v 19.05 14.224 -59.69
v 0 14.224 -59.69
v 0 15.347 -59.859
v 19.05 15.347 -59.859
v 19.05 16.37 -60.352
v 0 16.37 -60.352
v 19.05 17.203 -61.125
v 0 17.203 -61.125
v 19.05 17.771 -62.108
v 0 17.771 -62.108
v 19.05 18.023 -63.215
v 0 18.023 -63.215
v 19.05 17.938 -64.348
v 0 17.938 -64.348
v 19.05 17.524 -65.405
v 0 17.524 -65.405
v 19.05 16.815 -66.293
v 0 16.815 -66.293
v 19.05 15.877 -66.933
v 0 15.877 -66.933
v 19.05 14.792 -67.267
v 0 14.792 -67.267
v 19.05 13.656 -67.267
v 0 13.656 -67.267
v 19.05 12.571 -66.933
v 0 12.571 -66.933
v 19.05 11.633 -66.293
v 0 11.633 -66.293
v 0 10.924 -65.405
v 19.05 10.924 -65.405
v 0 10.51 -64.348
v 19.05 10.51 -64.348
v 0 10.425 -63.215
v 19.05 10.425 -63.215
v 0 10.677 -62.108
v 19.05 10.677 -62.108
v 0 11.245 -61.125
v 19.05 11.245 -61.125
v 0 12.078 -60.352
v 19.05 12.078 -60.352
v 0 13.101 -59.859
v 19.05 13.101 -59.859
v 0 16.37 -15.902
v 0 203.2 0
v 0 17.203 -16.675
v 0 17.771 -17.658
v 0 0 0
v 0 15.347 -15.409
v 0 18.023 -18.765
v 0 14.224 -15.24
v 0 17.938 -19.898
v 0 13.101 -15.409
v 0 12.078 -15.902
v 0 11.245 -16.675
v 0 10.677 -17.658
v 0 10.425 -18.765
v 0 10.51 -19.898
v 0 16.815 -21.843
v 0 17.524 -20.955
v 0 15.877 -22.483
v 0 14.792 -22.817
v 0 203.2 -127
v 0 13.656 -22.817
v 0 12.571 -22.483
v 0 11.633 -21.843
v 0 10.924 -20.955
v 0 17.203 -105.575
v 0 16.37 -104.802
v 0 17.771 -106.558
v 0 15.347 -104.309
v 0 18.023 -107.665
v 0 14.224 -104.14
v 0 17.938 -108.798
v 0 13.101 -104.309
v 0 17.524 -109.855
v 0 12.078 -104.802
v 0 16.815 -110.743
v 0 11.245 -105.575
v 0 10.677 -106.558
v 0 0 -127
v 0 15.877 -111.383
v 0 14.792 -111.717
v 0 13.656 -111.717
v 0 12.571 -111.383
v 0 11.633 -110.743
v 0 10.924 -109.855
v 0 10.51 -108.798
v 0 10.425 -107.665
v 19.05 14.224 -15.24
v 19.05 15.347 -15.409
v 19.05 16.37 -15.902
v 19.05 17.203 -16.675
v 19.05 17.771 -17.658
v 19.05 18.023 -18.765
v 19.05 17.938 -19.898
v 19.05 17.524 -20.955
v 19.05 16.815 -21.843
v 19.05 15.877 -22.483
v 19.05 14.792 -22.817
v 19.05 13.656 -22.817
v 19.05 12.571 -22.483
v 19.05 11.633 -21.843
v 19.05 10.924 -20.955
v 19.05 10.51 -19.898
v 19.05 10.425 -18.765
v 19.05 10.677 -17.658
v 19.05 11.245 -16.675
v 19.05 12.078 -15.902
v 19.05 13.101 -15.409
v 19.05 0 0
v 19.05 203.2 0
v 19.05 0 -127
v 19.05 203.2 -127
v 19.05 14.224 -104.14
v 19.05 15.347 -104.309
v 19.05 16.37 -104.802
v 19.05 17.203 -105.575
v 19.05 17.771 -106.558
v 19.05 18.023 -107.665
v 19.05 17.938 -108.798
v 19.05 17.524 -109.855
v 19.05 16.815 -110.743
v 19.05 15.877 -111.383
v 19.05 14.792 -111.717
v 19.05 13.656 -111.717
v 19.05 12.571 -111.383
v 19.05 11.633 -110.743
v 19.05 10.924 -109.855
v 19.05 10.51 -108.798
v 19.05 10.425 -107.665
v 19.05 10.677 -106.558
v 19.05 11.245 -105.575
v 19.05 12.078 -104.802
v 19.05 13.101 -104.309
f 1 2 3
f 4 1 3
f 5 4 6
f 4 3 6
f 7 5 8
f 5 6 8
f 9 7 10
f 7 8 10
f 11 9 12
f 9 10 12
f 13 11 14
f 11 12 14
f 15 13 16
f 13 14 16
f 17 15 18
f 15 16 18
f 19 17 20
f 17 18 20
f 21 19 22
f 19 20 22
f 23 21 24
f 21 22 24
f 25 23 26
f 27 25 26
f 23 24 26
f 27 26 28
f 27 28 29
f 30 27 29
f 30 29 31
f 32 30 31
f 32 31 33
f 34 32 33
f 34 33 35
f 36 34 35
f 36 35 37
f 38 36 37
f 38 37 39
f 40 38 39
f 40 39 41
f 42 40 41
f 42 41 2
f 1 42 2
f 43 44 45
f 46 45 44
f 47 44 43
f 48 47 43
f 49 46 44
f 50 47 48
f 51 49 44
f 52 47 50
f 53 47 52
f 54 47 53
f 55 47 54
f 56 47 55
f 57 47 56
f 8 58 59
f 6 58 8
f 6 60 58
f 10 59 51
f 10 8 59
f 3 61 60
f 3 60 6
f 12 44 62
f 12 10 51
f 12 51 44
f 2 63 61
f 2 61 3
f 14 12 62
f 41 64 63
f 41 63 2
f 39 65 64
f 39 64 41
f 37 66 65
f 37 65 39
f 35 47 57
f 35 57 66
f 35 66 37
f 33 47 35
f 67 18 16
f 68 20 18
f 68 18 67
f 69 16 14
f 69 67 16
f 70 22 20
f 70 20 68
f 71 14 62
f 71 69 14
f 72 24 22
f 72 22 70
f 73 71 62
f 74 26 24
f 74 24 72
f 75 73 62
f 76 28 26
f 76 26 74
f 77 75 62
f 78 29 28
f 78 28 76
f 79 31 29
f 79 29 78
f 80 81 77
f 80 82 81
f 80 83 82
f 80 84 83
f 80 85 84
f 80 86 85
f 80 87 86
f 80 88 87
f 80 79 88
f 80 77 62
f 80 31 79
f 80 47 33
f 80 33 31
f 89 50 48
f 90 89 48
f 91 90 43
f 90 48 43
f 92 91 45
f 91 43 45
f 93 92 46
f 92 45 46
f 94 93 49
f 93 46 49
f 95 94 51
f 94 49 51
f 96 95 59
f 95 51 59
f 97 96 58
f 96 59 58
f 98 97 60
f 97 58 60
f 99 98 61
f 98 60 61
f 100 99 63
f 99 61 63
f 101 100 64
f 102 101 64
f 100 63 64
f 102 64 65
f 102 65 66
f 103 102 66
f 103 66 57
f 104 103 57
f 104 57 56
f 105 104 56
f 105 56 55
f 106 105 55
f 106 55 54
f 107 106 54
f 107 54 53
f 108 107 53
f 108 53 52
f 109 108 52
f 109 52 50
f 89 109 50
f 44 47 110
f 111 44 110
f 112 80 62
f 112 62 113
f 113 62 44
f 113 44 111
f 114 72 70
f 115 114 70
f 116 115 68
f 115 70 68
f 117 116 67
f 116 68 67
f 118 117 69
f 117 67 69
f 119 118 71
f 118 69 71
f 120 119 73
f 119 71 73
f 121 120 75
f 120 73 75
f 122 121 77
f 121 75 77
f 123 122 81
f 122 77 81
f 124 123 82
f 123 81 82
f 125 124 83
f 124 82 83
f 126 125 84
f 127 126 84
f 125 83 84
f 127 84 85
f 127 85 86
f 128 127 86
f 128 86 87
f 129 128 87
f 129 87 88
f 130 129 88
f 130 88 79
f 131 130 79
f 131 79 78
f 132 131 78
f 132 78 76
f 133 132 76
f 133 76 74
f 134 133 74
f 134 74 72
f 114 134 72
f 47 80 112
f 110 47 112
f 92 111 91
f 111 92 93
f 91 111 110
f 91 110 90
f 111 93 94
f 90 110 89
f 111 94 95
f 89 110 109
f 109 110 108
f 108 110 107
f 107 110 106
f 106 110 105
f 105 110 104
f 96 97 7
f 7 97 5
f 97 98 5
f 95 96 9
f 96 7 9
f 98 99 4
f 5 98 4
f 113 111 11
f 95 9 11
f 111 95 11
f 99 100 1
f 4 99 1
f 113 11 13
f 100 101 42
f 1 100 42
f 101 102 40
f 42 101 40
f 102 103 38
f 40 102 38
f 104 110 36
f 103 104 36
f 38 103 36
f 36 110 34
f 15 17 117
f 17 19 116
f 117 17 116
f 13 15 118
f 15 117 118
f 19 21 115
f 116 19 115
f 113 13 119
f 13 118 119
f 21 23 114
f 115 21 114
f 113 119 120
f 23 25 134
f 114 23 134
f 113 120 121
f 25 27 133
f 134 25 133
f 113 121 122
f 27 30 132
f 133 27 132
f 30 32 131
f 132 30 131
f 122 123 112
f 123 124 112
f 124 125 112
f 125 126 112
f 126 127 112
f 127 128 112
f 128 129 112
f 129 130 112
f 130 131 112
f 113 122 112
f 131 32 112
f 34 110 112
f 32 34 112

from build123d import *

# Parameters (mm, degrees)
SKETCH1_W           = 19.05
SKETCH1_H           = 127
BOSS_EXTRUDE2_DEPTH = 203.2
SKETCH2_R           = 3.81
CUT_EXTRUDE1_DEPTH  = 88.138


with BuildPart() as part:
    # Sketch1 → Boss-Extrude2 (new body)
    with BuildSketch(Plane(origin=(0, 0, 0), x_dir=(1, 0, 0), z_dir=(0, 1, 0))):
        with Locations((9.525, 63.5)):
            Rectangle(SKETCH1_W, SKETCH1_H)
    extrude(amount=BOSS_EXTRUDE2_DEPTH)

    # Sketch2 → Cut-Extrude1 (cut)
    with BuildSketch(Plane.ZY):
        with Locations((-107.95, 14.224)):
            Circle(SKETCH2_R)
        with Locations((-63.5, 14.224)):
            Circle(SKETCH2_R)
        with Locations((-19.05, 14.224)):
            Circle(SKETCH2_R)
    extrude(amount=-CUT_EXTRUDE1_DEPTH, mode=Mode.SUBTRACT)


solid = part.part
